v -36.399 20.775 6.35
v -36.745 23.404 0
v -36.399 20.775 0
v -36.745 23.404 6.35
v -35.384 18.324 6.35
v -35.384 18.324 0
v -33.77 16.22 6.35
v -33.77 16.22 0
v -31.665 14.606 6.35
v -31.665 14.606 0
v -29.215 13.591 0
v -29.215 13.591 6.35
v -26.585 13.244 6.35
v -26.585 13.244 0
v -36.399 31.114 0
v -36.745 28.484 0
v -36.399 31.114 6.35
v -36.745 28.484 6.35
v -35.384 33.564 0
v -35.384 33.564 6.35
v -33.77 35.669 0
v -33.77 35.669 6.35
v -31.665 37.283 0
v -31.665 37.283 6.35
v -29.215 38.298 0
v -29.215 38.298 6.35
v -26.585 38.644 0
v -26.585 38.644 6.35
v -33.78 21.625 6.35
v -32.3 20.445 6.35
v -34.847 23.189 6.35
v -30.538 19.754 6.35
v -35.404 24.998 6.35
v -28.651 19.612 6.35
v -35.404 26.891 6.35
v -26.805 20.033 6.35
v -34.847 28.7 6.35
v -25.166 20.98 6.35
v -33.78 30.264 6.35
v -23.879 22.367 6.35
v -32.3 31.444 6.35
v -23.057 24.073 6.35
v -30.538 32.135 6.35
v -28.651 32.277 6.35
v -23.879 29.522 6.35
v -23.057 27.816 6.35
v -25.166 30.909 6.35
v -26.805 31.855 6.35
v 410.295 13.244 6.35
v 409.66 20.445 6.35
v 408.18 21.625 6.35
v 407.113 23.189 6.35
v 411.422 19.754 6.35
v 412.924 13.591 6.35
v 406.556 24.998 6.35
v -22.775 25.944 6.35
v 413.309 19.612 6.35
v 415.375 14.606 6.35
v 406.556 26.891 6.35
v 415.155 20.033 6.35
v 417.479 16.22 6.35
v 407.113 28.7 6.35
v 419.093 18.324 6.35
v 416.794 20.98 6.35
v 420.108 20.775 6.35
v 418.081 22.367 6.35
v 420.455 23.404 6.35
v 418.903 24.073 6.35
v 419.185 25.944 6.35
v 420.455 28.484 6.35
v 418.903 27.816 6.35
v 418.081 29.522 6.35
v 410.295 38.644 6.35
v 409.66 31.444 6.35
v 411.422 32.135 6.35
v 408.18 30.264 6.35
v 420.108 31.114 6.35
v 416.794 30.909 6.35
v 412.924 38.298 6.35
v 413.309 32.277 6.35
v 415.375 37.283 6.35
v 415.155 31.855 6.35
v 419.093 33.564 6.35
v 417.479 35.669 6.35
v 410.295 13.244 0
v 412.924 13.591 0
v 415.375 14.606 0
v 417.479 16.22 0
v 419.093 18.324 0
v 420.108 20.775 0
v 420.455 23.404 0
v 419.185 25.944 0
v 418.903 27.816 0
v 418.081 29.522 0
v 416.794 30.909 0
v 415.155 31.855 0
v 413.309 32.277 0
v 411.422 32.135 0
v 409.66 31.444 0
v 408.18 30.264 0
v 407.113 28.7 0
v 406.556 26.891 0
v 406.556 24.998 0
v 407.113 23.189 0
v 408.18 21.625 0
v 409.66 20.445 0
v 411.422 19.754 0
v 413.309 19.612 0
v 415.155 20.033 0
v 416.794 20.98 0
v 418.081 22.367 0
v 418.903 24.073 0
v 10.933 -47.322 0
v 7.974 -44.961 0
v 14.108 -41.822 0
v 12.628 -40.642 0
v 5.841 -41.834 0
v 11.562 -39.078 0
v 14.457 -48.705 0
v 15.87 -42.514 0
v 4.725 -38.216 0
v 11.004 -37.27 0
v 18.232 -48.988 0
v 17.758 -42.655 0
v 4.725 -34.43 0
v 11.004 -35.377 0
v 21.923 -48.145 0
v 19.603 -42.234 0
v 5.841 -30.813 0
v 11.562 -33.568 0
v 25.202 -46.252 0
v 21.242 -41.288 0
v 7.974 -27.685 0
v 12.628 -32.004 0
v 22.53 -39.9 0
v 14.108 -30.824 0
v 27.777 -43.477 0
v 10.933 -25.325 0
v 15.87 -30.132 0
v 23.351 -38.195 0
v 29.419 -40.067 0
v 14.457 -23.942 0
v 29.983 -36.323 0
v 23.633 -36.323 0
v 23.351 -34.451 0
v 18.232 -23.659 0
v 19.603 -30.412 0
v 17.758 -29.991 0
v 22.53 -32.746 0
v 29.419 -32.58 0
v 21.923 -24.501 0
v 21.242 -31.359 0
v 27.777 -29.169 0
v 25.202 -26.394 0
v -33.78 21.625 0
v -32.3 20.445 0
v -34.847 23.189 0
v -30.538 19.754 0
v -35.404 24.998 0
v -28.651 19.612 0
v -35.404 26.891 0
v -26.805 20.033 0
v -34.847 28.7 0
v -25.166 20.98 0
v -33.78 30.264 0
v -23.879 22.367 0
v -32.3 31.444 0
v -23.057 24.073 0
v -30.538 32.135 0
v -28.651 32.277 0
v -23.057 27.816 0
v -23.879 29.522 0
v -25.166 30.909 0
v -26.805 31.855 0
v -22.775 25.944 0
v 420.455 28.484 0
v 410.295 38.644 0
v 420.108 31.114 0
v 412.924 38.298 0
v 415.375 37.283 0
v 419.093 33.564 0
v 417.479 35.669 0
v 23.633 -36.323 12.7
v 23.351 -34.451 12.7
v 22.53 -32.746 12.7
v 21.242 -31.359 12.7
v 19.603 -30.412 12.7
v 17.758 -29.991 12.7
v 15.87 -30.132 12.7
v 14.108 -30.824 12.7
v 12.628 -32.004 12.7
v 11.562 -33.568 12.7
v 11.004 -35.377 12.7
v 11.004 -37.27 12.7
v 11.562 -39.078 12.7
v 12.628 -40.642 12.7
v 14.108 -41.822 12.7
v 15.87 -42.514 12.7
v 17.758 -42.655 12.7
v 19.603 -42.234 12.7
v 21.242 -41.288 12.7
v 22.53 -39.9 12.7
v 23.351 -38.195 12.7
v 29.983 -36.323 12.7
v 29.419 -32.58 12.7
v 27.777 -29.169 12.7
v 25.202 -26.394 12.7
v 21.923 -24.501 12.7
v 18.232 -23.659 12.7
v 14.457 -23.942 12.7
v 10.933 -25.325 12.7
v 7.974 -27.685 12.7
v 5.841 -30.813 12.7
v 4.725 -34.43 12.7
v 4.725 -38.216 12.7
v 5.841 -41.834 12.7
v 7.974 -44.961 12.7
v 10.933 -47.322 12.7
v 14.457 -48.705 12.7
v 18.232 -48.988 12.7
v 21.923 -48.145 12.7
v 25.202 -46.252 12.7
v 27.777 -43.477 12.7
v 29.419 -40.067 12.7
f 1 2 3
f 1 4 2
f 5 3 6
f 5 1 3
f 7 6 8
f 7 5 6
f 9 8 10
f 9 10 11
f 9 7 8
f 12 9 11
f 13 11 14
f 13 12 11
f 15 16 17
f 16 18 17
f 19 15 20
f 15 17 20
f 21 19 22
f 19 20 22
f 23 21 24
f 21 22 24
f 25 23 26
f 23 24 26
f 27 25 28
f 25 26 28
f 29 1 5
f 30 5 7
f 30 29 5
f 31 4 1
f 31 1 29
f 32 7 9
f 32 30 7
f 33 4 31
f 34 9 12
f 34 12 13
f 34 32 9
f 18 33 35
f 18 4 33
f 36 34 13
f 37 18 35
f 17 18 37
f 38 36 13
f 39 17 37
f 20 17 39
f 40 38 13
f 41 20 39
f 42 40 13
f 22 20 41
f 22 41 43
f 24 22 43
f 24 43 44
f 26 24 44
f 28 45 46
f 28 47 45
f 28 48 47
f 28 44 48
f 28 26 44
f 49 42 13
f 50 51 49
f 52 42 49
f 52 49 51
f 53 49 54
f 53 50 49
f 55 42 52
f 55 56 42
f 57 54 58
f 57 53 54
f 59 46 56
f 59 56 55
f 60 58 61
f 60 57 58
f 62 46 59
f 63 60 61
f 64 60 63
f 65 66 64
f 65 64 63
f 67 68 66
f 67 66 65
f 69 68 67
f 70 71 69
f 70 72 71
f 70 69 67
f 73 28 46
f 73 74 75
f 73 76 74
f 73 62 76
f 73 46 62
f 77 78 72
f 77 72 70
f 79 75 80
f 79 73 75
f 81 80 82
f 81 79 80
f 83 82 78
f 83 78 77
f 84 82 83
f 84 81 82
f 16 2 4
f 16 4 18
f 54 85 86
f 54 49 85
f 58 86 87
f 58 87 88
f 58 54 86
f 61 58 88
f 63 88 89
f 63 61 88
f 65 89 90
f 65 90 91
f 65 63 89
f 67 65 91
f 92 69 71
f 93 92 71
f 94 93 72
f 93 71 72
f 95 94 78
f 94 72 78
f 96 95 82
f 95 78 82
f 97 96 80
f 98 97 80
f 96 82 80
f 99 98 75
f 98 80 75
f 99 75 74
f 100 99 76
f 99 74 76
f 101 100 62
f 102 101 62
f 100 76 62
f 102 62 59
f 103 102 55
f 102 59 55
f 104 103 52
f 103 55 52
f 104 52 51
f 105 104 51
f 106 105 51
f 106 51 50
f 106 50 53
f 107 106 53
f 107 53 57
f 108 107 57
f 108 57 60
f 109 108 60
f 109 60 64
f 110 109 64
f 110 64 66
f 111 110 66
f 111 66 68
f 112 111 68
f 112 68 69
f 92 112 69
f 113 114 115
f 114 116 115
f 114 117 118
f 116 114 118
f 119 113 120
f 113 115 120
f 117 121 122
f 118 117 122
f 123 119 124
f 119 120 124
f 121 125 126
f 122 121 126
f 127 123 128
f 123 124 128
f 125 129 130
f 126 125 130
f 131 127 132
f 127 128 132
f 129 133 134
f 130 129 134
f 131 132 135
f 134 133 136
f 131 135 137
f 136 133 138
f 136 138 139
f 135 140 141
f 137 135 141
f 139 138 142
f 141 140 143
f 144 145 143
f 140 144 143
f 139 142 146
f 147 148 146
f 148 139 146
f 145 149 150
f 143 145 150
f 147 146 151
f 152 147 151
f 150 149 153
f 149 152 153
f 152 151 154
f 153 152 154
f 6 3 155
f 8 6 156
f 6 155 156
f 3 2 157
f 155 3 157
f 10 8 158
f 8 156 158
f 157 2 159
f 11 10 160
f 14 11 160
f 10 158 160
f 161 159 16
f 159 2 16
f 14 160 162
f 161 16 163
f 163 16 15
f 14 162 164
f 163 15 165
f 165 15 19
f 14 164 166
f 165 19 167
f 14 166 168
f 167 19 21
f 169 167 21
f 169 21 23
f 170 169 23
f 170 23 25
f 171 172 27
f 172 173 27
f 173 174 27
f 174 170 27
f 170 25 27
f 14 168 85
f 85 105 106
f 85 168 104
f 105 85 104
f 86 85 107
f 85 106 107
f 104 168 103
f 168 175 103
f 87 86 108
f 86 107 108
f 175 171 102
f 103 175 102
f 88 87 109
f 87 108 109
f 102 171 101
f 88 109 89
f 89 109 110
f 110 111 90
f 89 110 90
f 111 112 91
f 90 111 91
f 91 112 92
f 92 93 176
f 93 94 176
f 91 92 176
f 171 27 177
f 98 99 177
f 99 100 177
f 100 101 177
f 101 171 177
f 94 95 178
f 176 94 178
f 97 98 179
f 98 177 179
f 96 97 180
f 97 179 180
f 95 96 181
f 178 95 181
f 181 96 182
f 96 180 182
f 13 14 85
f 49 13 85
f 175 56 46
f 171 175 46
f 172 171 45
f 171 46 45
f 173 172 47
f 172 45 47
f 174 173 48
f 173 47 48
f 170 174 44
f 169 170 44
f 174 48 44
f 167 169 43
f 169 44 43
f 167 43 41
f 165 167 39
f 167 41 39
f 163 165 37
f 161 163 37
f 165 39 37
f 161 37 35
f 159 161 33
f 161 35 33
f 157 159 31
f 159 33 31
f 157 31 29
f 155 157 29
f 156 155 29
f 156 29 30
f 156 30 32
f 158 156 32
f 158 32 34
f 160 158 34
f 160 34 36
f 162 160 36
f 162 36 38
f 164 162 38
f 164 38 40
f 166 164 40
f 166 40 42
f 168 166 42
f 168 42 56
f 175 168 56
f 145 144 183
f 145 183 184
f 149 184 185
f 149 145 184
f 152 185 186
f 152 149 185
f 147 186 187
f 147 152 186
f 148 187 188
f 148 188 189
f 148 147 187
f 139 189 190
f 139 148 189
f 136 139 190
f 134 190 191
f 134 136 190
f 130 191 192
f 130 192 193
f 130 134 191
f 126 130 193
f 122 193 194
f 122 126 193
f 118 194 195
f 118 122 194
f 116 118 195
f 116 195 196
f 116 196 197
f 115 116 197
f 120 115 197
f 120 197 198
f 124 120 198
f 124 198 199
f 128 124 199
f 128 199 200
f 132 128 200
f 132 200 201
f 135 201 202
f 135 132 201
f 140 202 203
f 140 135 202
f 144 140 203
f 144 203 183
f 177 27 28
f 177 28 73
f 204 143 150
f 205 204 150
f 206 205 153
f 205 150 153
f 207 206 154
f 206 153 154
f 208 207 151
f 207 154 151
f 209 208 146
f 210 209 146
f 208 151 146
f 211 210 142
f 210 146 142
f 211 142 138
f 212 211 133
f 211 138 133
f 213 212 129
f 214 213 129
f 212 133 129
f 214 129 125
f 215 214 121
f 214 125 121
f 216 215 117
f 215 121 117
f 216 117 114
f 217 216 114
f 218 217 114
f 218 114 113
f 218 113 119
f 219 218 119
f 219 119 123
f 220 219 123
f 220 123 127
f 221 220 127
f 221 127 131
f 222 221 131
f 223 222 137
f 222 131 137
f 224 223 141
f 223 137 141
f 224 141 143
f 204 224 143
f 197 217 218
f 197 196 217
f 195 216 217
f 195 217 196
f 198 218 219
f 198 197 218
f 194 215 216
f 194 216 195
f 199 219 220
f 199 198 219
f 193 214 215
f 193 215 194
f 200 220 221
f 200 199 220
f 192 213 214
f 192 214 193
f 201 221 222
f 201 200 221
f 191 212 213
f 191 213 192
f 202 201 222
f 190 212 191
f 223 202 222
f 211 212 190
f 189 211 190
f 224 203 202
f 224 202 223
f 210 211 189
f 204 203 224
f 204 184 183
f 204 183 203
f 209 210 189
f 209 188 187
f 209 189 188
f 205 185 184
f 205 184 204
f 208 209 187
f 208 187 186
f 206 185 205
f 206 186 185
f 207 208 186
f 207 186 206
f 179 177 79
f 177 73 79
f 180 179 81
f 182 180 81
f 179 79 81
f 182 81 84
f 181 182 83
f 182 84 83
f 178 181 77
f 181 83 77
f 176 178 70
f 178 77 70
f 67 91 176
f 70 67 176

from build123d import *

# Parameters (mm, degrees)
F0_W     = 457.2
F0_H     = 25.4
F1_DEPTH = 6.35
F2_R     = 6.35
F3_DEPTH = 25.4
F4_R     = 12.7
F4_R_2   = 6.35
F5_DEPTH = 12.7
F6_R     = 10.16


with BuildPart() as f1:
    # F0 (on Top) → F1 (new body)
    with BuildSketch(Plane.XY):
        with Locations((191.854619, 25.94442)):
            Rectangle(F0_W, F0_H)
    extrude(amount=F1_DEPTH)

    # F2 (on face) → F3 (cut)
    with BuildSketch(Plane.XY.offset(6.35)):
        with Locations((-29.125381, 25.94442)):
            Circle(F2_R)
        with Locations((412.834619, 25.94442)):
            Circle(F2_R)
    extrude(amount=-F3_DEPTH, mode=Mode.SUBTRACT)

    # F6
    f6_edges = [f1.edges().sort_by_distance(p)[0] for p in [
        (-36.745381, 13.24442, 3.175),
        (-36.745381, 38.64442, 3.175),
        (420.454619, 38.64442, 3.175),
        (420.454619, 13.24442, 3.175),
    ]]
    fillet(f6_edges, radius=F6_R)


with BuildPart() as f5:
    # F4 (on Top) → F5 (new body)
    with BuildSketch(Plane.XY):
        with Locations((17.283294, -36.323182)):
            Circle(F4_R)
        with Locations((17.283294, -36.323182)):
            Circle(F4_R_2, mode=Mode.SUBTRACT)
    extrude(amount=F5_DEPTH)


solid = Compound([f1.part, f5.part])
